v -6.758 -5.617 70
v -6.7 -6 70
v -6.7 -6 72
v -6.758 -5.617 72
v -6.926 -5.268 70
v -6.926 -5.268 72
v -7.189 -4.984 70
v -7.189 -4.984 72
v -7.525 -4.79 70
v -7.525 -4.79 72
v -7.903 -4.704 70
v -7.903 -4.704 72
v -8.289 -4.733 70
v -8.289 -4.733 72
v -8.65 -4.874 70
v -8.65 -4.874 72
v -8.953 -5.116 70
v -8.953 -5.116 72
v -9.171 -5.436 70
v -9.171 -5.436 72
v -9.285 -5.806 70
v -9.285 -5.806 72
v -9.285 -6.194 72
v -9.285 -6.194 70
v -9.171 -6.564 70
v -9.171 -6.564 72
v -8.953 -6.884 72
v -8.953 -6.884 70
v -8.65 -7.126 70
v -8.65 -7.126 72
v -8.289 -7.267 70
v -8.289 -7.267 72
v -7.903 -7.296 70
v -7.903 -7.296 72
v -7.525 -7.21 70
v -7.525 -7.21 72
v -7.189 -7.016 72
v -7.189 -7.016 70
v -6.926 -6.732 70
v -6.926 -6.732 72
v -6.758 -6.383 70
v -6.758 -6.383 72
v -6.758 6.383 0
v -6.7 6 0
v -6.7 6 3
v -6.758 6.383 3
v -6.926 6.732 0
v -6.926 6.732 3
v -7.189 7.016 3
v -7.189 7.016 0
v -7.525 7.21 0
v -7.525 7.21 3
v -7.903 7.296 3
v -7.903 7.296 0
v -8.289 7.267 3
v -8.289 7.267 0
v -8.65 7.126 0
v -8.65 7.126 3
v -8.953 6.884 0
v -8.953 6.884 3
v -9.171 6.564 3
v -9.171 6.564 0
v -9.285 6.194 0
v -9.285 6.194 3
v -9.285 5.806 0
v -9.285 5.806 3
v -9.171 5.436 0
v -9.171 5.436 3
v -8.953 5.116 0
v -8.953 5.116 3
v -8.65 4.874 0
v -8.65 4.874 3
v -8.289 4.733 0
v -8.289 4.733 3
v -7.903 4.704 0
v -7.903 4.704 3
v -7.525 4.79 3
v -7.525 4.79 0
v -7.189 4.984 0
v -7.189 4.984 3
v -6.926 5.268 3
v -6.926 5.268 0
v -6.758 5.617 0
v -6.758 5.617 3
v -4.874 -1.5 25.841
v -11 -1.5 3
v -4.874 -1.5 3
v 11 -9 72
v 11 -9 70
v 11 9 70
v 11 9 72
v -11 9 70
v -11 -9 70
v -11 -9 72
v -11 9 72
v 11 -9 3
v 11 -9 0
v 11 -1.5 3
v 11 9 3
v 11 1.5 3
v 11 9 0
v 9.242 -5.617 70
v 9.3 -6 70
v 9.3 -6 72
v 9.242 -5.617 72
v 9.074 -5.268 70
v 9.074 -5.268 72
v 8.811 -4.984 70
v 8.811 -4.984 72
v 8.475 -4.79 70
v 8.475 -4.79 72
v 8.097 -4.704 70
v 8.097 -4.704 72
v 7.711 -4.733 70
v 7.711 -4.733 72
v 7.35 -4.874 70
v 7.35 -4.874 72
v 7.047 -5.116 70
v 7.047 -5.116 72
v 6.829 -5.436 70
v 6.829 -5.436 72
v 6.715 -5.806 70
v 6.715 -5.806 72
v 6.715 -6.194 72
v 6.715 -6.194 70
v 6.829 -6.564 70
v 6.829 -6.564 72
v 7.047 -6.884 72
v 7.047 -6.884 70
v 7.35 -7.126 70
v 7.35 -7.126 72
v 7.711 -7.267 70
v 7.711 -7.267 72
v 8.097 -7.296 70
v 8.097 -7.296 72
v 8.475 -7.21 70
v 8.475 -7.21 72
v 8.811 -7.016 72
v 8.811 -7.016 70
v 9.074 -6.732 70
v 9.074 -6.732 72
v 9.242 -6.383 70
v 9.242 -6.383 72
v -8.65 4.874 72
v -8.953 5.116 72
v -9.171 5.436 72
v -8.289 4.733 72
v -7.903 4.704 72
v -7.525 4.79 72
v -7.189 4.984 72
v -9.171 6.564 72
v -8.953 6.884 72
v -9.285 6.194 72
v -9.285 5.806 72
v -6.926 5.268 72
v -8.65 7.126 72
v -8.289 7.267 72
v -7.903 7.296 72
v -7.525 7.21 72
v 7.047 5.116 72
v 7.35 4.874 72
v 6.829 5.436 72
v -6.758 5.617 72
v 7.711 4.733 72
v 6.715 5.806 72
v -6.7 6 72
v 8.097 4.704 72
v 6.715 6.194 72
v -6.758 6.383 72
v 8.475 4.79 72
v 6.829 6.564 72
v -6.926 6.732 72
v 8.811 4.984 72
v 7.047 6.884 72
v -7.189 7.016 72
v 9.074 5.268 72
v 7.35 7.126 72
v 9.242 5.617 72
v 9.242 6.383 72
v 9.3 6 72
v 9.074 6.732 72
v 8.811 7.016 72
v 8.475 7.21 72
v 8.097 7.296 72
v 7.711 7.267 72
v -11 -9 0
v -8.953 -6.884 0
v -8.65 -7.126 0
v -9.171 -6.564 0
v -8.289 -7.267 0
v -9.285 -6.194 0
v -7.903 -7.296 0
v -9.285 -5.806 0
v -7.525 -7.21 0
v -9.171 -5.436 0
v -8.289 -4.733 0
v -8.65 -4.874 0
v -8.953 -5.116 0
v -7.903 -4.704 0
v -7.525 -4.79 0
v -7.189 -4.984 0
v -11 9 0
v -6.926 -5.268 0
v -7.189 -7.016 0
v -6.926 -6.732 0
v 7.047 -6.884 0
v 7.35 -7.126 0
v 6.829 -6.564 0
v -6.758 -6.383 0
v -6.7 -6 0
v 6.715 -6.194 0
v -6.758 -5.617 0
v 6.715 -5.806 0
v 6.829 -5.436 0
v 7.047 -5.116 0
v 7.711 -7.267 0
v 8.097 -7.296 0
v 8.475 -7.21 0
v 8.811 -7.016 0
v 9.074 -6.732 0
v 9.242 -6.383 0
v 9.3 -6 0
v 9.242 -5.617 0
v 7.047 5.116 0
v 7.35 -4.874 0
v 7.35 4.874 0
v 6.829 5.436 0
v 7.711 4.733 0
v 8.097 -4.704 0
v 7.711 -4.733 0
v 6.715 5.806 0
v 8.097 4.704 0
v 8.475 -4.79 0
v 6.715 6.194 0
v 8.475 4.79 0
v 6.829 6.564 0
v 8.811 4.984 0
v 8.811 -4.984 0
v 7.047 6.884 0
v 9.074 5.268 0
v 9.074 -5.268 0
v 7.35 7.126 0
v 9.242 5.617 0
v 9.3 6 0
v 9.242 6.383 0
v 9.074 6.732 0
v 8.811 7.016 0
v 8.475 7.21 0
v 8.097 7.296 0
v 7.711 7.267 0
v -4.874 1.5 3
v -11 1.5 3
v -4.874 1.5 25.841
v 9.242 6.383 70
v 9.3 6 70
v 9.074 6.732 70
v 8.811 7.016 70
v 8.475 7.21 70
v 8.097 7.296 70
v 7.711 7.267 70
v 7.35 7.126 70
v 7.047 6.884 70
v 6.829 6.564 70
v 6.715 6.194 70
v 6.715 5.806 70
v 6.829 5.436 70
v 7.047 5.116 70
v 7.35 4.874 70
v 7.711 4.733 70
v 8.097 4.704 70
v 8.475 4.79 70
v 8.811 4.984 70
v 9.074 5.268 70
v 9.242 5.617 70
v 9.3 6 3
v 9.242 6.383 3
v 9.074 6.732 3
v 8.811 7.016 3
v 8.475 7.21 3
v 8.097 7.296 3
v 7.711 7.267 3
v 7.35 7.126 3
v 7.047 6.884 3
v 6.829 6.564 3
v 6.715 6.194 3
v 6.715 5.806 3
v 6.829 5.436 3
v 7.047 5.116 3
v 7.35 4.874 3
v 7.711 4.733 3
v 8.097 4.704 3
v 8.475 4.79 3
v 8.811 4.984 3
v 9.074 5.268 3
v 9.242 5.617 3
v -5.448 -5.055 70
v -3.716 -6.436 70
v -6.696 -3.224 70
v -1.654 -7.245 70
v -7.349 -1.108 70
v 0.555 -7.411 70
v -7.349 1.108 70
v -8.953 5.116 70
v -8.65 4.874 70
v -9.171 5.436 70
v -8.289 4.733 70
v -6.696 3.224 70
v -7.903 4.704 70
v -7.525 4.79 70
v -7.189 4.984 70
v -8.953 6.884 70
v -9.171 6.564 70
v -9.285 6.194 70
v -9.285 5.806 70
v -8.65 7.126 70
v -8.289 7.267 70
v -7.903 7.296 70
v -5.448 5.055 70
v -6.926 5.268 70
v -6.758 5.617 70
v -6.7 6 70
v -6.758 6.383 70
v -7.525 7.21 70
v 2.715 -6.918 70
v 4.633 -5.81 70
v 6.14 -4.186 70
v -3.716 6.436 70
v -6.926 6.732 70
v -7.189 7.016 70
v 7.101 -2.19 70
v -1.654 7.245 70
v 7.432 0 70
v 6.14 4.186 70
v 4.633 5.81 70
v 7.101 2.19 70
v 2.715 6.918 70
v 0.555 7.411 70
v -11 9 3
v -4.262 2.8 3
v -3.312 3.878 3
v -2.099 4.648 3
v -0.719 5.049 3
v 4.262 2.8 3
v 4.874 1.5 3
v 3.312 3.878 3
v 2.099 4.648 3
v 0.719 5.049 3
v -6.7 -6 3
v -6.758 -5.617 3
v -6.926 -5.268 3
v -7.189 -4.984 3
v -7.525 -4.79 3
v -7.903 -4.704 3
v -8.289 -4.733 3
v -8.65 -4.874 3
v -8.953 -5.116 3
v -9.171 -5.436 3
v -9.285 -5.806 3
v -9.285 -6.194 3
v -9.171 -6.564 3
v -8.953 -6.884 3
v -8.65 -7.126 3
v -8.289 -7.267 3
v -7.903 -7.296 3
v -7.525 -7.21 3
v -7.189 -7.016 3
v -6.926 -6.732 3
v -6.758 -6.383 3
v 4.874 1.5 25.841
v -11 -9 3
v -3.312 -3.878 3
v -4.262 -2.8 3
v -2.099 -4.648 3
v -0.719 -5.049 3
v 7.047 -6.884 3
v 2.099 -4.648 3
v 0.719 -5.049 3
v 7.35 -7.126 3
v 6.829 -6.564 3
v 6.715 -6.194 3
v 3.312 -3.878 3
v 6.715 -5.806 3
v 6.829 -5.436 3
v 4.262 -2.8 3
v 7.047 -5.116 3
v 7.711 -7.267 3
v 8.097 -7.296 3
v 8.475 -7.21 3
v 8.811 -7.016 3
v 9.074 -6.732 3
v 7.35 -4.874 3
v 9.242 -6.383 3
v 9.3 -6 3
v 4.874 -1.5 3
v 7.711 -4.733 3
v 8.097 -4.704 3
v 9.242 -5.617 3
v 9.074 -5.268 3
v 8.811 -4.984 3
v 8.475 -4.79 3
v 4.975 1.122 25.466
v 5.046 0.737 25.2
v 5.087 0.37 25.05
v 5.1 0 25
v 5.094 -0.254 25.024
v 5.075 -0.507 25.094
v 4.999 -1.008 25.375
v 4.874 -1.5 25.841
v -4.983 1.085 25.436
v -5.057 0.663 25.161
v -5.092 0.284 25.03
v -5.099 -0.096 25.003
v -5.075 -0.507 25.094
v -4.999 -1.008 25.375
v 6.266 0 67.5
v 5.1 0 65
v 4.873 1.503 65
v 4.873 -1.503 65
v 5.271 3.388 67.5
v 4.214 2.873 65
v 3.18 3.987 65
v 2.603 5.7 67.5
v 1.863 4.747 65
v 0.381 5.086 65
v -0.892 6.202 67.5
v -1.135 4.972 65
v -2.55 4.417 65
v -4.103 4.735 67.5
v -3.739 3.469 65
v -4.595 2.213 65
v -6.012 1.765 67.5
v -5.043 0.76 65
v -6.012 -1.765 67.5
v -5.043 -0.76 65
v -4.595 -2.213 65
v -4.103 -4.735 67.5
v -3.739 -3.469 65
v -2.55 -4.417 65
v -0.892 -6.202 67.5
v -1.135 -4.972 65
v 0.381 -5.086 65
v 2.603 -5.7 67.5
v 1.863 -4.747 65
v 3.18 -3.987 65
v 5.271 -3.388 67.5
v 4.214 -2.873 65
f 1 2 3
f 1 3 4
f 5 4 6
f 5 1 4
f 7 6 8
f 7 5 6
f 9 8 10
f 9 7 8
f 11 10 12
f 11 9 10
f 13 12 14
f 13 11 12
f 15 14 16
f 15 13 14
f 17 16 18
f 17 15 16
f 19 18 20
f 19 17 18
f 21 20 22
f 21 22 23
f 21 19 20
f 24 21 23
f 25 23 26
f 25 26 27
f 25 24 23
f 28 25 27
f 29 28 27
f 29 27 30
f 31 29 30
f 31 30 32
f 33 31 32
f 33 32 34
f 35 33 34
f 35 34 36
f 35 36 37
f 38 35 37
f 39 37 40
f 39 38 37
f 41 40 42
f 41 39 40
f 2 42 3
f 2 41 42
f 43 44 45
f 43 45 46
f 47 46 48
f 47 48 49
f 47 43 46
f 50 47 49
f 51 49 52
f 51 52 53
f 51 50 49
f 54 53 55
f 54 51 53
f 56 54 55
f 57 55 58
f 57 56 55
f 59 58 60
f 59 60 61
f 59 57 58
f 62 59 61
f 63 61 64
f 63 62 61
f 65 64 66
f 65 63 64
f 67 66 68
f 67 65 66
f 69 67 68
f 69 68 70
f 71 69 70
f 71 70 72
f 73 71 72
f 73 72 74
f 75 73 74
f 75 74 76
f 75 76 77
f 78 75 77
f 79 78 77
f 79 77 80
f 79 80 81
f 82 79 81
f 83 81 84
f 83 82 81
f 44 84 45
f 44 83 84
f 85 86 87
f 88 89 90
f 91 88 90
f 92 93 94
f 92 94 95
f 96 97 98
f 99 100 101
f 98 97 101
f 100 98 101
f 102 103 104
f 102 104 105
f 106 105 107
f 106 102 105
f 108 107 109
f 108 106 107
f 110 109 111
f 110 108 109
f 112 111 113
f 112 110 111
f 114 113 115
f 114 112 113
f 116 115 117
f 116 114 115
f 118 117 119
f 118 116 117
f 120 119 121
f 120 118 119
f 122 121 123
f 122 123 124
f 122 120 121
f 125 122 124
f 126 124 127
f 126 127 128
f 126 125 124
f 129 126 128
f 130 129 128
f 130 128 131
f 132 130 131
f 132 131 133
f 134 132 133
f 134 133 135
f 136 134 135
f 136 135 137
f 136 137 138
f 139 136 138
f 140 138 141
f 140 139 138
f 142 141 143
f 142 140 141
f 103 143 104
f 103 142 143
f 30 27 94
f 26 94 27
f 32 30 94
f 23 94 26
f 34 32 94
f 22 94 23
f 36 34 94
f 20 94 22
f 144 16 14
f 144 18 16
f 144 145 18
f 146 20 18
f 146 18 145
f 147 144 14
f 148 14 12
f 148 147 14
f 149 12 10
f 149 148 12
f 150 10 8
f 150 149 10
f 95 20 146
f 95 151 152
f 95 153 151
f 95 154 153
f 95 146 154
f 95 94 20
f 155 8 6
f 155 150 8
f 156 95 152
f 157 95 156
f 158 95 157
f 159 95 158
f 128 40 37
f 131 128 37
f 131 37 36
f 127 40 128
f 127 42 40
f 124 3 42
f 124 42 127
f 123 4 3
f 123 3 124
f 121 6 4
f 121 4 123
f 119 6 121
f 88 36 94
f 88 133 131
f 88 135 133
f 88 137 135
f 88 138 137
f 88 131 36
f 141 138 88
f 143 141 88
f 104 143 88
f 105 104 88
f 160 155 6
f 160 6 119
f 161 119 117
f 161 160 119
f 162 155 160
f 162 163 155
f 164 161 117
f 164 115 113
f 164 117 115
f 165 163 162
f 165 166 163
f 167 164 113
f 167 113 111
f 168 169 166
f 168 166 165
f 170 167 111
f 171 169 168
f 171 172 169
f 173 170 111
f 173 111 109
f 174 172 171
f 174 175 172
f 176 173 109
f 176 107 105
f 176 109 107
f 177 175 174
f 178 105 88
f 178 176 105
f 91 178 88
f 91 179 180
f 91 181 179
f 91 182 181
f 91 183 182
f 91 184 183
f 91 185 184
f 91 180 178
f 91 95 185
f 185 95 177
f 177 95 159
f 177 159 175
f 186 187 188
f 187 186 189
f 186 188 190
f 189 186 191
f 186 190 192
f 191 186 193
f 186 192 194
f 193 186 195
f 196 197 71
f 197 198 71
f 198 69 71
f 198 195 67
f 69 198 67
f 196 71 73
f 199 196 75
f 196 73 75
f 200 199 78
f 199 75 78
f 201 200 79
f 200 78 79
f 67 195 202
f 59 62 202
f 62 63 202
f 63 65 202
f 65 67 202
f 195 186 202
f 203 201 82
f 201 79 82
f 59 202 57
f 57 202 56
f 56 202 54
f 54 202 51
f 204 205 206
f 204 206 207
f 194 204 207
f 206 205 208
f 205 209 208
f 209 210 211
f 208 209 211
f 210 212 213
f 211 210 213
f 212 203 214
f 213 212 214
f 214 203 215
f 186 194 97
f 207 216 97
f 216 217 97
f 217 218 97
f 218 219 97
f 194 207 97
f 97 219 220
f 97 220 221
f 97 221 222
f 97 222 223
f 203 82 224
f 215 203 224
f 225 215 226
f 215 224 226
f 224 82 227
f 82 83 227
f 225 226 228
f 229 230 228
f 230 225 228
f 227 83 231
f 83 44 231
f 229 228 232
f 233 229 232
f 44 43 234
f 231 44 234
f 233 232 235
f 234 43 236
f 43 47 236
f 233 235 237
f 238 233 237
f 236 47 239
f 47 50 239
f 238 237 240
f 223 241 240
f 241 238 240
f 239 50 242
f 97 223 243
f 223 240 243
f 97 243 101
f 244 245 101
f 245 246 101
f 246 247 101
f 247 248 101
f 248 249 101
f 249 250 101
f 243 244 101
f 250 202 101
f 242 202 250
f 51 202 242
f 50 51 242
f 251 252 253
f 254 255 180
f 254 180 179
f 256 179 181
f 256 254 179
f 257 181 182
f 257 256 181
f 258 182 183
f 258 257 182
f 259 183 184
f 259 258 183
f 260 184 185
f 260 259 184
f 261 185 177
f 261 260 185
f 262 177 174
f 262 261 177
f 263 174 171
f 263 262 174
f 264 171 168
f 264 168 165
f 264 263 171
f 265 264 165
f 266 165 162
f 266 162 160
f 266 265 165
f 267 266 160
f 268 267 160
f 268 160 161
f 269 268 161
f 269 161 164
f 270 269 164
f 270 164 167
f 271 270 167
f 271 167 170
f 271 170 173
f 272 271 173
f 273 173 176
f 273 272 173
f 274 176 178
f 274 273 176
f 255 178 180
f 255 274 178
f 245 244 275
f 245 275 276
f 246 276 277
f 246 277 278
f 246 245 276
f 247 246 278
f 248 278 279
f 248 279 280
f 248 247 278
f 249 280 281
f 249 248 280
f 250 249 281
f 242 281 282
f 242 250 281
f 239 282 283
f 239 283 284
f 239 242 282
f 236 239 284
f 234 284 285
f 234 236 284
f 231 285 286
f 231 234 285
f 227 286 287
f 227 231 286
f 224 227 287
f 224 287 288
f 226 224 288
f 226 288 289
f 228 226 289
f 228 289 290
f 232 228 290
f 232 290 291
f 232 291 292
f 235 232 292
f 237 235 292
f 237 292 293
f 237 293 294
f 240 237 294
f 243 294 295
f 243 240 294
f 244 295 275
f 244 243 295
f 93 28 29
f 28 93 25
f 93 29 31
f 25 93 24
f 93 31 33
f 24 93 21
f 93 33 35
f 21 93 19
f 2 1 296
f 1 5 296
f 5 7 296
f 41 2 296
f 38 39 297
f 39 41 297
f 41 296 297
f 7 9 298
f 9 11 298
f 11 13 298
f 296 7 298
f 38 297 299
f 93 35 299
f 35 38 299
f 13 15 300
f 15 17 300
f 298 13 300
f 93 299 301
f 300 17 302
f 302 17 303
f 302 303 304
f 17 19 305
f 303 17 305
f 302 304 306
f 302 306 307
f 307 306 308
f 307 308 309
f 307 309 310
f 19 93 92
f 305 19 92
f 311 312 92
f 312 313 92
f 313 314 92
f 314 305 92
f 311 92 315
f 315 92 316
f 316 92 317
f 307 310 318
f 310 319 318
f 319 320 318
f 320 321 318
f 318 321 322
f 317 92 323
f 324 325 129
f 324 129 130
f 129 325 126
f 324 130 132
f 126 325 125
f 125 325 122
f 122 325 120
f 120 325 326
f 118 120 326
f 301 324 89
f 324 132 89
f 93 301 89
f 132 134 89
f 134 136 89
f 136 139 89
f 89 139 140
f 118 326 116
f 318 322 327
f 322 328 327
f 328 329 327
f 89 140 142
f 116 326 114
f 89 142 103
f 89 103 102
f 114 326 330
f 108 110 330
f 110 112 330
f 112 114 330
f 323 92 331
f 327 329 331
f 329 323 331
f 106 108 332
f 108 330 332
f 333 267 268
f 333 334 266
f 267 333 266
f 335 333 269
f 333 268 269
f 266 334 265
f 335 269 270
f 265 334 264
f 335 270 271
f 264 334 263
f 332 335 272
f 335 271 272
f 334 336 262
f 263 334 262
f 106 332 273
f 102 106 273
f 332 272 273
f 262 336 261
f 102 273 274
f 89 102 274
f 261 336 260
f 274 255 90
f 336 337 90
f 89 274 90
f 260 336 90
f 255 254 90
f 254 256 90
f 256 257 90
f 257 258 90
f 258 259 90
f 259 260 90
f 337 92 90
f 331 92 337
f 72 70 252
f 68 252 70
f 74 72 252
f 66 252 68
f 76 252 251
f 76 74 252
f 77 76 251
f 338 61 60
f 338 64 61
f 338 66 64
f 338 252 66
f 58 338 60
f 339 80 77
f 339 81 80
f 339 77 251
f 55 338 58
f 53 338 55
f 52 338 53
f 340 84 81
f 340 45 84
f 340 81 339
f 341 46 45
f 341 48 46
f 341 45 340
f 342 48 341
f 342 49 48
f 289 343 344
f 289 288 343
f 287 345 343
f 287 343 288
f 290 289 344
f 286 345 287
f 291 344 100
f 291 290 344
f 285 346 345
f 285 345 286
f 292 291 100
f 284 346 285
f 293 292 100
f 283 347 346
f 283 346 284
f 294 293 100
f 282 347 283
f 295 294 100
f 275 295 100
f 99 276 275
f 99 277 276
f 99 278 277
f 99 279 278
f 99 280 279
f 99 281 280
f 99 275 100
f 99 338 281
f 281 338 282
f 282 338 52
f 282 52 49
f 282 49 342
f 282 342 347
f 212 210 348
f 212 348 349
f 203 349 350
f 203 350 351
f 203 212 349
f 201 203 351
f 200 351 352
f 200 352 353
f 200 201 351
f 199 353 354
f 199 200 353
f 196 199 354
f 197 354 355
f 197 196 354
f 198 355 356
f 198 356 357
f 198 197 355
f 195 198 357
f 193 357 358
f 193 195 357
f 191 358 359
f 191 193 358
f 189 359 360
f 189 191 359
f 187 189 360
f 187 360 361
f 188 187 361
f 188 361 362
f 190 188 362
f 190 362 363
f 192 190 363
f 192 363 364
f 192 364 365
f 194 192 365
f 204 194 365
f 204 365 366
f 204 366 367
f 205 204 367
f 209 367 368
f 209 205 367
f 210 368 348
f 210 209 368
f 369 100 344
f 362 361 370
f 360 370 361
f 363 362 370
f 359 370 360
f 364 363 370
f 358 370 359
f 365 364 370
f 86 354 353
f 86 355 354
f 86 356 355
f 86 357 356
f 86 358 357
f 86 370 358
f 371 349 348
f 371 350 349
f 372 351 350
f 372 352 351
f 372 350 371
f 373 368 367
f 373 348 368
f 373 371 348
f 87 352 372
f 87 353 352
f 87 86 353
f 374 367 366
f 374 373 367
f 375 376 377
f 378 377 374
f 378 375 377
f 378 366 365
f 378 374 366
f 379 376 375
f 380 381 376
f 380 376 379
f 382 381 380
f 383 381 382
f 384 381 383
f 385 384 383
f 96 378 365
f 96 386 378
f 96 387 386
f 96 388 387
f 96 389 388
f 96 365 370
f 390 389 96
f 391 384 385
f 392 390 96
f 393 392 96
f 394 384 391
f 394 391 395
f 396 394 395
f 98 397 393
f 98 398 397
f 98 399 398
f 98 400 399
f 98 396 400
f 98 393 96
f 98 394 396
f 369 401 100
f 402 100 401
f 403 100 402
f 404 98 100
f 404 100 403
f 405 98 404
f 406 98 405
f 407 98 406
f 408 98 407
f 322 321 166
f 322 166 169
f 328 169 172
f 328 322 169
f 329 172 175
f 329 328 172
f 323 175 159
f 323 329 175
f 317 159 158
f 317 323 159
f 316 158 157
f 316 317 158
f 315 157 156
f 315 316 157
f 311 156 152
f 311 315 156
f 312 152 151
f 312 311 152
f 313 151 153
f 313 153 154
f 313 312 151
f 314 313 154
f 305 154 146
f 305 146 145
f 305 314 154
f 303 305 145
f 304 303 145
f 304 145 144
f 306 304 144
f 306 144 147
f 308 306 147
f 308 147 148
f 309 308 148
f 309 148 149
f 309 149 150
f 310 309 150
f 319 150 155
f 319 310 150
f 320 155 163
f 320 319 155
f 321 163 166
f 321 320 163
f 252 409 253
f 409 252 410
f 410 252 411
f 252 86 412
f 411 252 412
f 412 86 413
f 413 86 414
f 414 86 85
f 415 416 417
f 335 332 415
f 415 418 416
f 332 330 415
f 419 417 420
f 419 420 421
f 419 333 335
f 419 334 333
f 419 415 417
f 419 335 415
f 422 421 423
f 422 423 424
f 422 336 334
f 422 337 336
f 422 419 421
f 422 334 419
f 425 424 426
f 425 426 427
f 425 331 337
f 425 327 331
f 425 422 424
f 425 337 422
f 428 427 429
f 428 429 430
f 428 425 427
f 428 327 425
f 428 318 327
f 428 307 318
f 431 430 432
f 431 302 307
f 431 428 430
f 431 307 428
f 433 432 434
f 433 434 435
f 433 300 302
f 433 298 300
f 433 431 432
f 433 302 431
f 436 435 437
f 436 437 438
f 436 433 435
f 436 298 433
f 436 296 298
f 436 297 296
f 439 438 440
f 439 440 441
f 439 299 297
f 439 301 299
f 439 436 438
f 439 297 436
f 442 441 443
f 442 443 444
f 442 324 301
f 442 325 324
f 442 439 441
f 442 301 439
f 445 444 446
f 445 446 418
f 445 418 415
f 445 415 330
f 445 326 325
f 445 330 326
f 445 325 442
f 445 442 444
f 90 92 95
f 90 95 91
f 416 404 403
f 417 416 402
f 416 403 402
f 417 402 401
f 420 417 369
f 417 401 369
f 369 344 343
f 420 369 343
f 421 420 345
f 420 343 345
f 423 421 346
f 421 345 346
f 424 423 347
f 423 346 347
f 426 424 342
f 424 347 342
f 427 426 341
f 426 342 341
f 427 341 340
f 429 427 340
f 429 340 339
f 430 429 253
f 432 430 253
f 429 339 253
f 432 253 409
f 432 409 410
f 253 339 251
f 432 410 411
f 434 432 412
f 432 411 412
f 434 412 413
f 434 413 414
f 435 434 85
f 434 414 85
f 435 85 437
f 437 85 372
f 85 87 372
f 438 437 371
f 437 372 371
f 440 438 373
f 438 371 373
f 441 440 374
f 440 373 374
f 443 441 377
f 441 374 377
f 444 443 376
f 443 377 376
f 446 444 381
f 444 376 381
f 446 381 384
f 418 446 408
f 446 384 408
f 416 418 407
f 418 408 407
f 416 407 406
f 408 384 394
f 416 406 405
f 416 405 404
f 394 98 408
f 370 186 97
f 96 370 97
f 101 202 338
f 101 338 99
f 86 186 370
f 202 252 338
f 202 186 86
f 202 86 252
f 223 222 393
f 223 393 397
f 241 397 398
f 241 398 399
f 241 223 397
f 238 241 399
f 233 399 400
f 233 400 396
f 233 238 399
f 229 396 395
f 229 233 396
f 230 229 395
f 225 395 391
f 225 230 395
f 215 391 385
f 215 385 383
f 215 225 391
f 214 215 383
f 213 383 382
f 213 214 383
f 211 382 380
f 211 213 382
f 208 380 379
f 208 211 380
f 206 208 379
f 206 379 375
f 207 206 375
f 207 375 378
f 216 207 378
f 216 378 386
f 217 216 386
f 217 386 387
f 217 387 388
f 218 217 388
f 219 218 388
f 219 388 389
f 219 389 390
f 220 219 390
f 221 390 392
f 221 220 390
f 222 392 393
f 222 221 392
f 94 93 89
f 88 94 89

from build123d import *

# Parameters (mm, degrees)
SKETCH1_W           = 22
SKETCH1_H           = 18
SKETCH1_R           = 1.3
SKETCH1_R_2         = 5.1
BOSS_EXTRUDE1_DEPTH = 3
SKETCH1_3_R         = 5.1
BOSS_EXTRUDE2_DEPTH = 70
SKETCH2_W           = 22
SKETCH2_H           = 18
SKETCH2_R           = 1.3
BOSS_EXTRUDE3_DEPTH = 2
CHAMFER2_SIZE       = 5
CHAMFER2_SIZE2      = 2.331538291
RIB2_REACH          = 75.389
SKETCH3_WALL_W      = 171.556146136
SKETCH3_WALL_H      = 3
RIB3_REACH          = 75.389
SKETCH4_WALL_W      = 171.556146136
SKETCH4_WALL_H      = 3


with BuildPart() as part:
    # Sketch1 → Boss-Extrude1 (new body)
    with BuildSketch(Plane.XY):
        Rectangle(SKETCH1_W, SKETCH1_H)
        with Locations((8, 6)):
            Circle(SKETCH1_R, mode=Mode.SUBTRACT)
        with Locations((8, -6)):
            Circle(SKETCH1_R, mode=Mode.SUBTRACT)
        with Locations((-8, -6)):
            Circle(SKETCH1_R, mode=Mode.SUBTRACT)
        with Locations((-8, 6)):
            Circle(SKETCH1_R, mode=Mode.SUBTRACT)
        Circle(SKETCH1_R_2, mode=Mode.SUBTRACT)
    extrude(amount=BOSS_EXTRUDE1_DEPTH)

    # Sketch1<3> → Boss-Extrude2 (add)
    with BuildSketch(Plane.XY):
        Circle(SKETCH1_3_R)
    extrude(amount=BOSS_EXTRUDE2_DEPTH)

    # Sketch2 → Boss-Extrude3 (add)
    with BuildSketch(Plane.XY.offset(70)):
        Rectangle(SKETCH2_W, SKETCH2_H)
        with Locations((-8, 6)):
            Circle(SKETCH2_R, mode=Mode.SUBTRACT)
        with Locations((-8, -6)):
            Circle(SKETCH2_R, mode=Mode.SUBTRACT)
        with Locations((8, -6)):
            Circle(SKETCH2_R, mode=Mode.SUBTRACT)
        with Locations((8, 6)):
            Circle(SKETCH2_R, mode=Mode.SUBTRACT)
    extrude(amount=BOSS_EXTRUDE3_DEPTH)

    # Chamfer2
    chamfer2_edges = [part.edges().sort_by_distance(p)[0] for p in [
        (-5.1, 0, 70),
    ]]
    chamfer2_side = [part.faces().sort_by_distance(p)[0] for p in [
        (-5.1, 0, 36.5),
    ]]
    chamfer(chamfer2_edges, length=CHAMFER2_SIZE, length2=CHAMFER2_SIZE2, reference=chamfer2_side[0])

    # Sketch3 wall → Rib2 (add, up to next)
    with BuildSketch(Plane(origin=(-8.05, 0, 14), x_dir=(0.259028674037, 0, 0.965869632003), z_dir=(0.965869632003, 0, -0.259028674037)), mode=Mode.PRIVATE) as rib2_sk1:
        Rectangle(SKETCH3_WALL_W, SKETCH3_WALL_H)
    rib2_tool1 = extrude(rib2_sk1.sketch, amount=RIB2_REACH, mode=Mode.PRIVATE) - part.part
    add(rib2_tool1.solids().sort_by_distance((-8.05, 0, 14))[0])

    # Sketch4 wall → Rib3 (add, up to next)
    with BuildSketch(Plane(origin=(8.05, 0, 14), x_dir=(-0.259028674037, 0, 0.965869632003), z_dir=(0.965869632003, 0, 0.259028674037)), mode=Mode.PRIVATE) as rib3_sk1:
        Rectangle(SKETCH4_WALL_W, SKETCH4_WALL_H)
    rib3_tool1 = extrude(rib3_sk1.sketch, amount=-RIB3_REACH, mode=Mode.PRIVATE) - part.part
    add(rib3_tool1.solids().sort_by_distance((8.05, 0, 14))[0])


solid = part.part
